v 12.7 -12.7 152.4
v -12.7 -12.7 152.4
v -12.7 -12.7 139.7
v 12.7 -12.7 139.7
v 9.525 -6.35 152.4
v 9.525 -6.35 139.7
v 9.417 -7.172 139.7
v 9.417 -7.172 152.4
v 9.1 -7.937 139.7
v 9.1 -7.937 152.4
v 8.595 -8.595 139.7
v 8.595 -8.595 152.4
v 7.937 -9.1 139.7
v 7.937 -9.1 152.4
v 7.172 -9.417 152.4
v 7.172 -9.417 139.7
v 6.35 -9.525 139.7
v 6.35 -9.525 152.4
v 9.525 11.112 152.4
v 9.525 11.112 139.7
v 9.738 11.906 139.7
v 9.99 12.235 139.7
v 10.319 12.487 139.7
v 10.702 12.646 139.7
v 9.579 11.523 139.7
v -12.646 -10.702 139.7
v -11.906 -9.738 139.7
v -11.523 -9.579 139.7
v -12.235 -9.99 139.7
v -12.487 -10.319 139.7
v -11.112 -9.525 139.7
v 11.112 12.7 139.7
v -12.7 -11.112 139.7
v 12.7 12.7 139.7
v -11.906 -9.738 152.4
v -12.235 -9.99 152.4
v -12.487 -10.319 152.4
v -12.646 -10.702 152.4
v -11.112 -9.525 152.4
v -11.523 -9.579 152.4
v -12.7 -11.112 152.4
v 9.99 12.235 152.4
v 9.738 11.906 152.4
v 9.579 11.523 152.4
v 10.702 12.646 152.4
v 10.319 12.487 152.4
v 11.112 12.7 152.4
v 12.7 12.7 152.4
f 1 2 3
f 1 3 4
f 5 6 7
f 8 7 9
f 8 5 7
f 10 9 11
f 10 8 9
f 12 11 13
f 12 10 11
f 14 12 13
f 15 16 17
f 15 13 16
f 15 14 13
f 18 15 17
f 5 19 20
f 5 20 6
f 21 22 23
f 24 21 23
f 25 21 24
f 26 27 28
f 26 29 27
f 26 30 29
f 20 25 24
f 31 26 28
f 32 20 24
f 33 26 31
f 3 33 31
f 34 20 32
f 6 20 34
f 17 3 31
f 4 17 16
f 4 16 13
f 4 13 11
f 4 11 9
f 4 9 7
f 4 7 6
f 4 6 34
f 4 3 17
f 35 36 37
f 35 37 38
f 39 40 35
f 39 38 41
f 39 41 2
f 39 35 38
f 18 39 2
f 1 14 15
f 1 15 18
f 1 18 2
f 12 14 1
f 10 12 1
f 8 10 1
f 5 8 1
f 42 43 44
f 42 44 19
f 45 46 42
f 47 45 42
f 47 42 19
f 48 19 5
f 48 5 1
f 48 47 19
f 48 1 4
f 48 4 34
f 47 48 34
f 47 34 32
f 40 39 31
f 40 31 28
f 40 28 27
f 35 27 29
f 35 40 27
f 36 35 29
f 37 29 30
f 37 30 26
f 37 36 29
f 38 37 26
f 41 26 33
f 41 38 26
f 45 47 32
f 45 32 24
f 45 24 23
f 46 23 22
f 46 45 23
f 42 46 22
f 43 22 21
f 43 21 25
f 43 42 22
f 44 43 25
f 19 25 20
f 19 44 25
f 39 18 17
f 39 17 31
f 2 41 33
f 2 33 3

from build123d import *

# Parameters (mm, degrees)
BOSS_EXTRUDE1_DEPTH = 152.4
SKETCH3_W           = 36.131988192
SKETCH3_H           = 294.530449207
CUT_EXTRUDE1_DEPTH  = 156.02325632


with BuildPart() as part:
    # Sketch2 → Boss-Extrude1 (new, symmetric)
    with BuildSketch(Plane.XY):
        with BuildLine():
            Line((-12.7, -12.7), (12.7, -12.7))
            Line((12.7, -12.7), (12.7, 12.7))
            Line((12.7, 12.7), (11.1125, 12.7))
            ThreePointArc((11.1125, 12.7), (9.989967985, 12.235032015), (9.525, 11.1125))
            Line((9.525, 11.1125), (9.525, -6.35))
            ThreePointArc((9.525, -6.35), (8.59506403, -8.59506403), (6.35, -9.525))
            Line((6.35, -9.525), (-11.1125, -9.525))
            ThreePointArc((-11.1125, -9.525), (-12.235032015, -9.989967985), (-12.7, -11.1125))
            Line((-12.7, -11.1125), (-12.7, -12.7))
        make_face()
    extrude(amount=BOSS_EXTRUDE1_DEPTH, both=True)

    # Sketch3 → Cut-Extrude1 (cut, through all)
    with BuildSketch(Plane.XZ.offset(12.7)):
        with Locations((-0.553949025, -7.565224603)):
            Rectangle(SKETCH3_W, SKETCH3_H)
    extrude(amount=-CUT_EXTRUDE1_DEPTH, mode=Mode.SUBTRACT)


solid = part.part
